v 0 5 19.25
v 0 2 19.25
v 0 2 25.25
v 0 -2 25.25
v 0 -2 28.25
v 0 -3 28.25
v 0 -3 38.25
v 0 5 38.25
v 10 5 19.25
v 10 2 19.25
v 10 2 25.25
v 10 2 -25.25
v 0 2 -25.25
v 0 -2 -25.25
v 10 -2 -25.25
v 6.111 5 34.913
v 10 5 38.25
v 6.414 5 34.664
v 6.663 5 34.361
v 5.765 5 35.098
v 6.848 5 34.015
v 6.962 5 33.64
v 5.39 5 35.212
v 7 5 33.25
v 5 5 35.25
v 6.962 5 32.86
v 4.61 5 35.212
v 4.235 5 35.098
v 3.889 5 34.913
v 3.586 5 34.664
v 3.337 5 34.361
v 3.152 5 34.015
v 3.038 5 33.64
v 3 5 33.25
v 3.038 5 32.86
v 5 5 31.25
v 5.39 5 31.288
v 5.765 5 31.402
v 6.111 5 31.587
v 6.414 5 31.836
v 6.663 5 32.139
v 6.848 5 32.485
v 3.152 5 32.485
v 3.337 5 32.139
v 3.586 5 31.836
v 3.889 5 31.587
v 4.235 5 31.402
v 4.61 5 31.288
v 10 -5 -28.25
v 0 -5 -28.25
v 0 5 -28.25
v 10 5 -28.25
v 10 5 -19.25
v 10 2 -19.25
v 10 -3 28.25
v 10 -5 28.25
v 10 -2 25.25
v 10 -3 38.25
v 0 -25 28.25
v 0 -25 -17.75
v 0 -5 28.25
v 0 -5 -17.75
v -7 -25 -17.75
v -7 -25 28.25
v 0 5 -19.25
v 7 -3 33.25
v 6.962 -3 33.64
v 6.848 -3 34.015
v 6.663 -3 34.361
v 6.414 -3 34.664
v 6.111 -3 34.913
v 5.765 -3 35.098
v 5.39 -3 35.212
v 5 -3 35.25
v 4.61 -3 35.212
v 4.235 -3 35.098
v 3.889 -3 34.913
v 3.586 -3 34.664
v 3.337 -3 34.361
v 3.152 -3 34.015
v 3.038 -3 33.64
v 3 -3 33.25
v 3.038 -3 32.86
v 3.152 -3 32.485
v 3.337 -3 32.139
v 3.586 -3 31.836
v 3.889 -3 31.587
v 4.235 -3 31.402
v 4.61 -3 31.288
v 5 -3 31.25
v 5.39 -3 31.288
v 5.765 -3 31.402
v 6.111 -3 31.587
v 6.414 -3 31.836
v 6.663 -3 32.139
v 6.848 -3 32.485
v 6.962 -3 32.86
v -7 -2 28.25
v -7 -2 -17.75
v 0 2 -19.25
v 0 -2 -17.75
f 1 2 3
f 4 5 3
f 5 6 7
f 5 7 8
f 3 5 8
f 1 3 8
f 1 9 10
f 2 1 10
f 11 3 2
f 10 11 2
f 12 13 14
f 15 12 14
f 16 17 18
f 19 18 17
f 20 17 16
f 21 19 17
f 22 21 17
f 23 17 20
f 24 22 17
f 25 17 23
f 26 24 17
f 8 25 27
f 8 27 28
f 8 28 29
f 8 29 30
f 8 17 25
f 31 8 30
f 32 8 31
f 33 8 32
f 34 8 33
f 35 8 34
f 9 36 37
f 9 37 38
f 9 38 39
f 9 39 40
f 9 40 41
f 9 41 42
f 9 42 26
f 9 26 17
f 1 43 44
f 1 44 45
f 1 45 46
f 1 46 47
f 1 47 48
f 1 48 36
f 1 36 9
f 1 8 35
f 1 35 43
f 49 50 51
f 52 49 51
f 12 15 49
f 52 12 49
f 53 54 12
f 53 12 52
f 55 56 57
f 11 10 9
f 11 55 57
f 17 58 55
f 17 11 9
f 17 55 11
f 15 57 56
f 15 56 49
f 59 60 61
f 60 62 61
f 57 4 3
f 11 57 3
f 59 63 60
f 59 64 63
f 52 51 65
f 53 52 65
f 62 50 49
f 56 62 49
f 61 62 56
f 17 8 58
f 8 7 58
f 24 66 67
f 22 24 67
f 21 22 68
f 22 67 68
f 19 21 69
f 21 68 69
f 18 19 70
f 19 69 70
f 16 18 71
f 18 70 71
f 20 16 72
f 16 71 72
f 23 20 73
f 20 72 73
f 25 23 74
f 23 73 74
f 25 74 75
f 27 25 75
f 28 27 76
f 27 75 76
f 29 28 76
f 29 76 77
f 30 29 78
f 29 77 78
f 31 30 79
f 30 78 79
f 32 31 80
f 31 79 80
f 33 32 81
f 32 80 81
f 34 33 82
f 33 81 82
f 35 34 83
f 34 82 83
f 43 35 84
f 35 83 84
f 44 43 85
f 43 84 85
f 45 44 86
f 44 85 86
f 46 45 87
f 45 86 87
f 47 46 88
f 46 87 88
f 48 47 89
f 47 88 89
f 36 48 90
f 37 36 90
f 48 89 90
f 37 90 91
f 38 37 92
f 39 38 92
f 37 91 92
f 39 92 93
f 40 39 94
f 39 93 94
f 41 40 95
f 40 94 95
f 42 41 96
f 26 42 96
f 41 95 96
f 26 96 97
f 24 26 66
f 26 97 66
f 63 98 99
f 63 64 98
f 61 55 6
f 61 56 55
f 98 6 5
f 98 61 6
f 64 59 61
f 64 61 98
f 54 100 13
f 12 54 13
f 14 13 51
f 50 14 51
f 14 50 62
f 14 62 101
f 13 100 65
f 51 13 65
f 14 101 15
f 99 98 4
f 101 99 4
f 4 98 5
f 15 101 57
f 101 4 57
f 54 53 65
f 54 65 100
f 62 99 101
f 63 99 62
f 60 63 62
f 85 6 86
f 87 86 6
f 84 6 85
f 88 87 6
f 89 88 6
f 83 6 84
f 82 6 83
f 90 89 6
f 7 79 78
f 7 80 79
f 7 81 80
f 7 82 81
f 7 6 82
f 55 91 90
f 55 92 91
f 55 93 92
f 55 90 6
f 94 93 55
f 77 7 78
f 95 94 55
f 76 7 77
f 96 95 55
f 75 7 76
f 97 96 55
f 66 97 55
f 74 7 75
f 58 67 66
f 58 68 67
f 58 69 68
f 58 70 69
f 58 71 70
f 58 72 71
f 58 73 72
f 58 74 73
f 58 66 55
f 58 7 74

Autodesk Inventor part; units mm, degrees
ref_plane "YZ Plane" through (0, 0, 0) normal (1, 0, 0) x (0, 1, 0)
ref_plane "XZ Plane" through (0, 0, 0) normal (0, 1, 0) x (-1, 0, 0)
ref_plane "XY Plane" through (0, 0, 0) normal (0, 0, 1) x (1, 0, 0)
sketch "Эскиз1" plane through (0, 0, 0) normal (1, 0, 0) x (0, 1, 0)
  line L0 (-2, 25.25) -> (2, 25.25)
  line L1 (2, 25.25) -> (2, -25.25)
  line L2 (2, -25.25) -> (-2, -25.25)
  line L3 (-2, -25.25) -> (-2, 25.25)
  line L4 (-2, 25.25) -> (2, -25.25) construction
  line L5 (2, 25.25) -> (-2, -25.25) construction
  line L6 (2, 25.25) -> (5, 25.25)
  line L7 (5, 25.25) -> (5, 19.25)
  line L8 (5, 19.25) -> (2, 19.25)
  line L9 (2, 19.25) -> (2, 25.25)
  line L10 (2, -25.25) -> (5, -25.25)
  line L11 (5, -25.25) -> (5, -19.25)
  line L12 (5, -19.25) -> (2, -19.25)
  line L13 (2, -19.25) -> (2, -25.25)
  line L14 (5, 25.25) -> (-5, 25.25)
  line L15 (-5, 25.25) -> (-5, 28.25)
  line L16 (-5, 28.25) -> (5, 28.25)
  line L17 (5, 28.25) -> (5, 25.25)
  line L18 (5, -25.25) -> (-5, -25.25)
  line L19 (-5, -25.25) -> (-5, -28.25)
  line L20 (-5, -28.25) -> (5, -28.25)
  line L21 (5, -28.25) -> (5, -25.25)
  line L22 (-5, 28.25) -> (-2, 28.25)
  line L23 (-2, 28.25) -> (-2, -28.25)
  line L24 (-2, -28.25) -> (-5, -28.25)
  line L25 (-5, -28.25) -> (-5, 28.25)
  point P0 (0, 0)
  dimension "d0" = 4
  dimension "d1" = 50.5
  dimension "d2" = 3
  dimension "d3" = 6
  dimension "d4" = 3
  dimension "d5" = 6
  dimension "d6" = 10
  dimension "d7" = 10
  dimension "d8" = 3
  dimension "d9" = 3
extrude "Выдавливание1" add sketch "Эскиз1" along normal blind 10 contours L23 L16 L17 L6 L0 | L3 L18 L25 L14 | L14 L15 L16 L23 | L6 L7 L8 L1 | L23 L20 L19 L18 | L2 L10 L21 L20 L23 | L1 L12 L11 L10
sketch "Эскиз2" plane through (0, -5, -28.25) normal (0, -1, 0) x (1, 0, 0)
  line L0 (10, 47.5) -> (10, 56.5) projected
  line L1 (10, 56.5) -> (0, 56.5)
  line L2 (0, 56.5) -> (0, 66.5)
  line L3 (0, 66.5) -> (10, 66.5)
  line L4 (10, 66.5) -> (10, 56.5)
  circle A0 centre (5, 61.5) radius 2
  line L5 (0, 61.5) -> (3, 61.5)
  line L6 (7, 61.5) -> (10, 61.5)
  point P0 (0, 28.25)
  dimension "d14" = 10
  dimension "d15" = 10
  dimension "d29" = 4
  dimension "d30" = 5
  dimension "d31" = 5
extrude "Выдавливание2" add sketch "Эскиз2" against normal blind 10 contours L1 L2 L5 A0 L6 L4 | L6 A0 L5 L2 L3 L4
sketch "Эскиз3" plane through (0, -5, -28.25) normal (0, -1, 0) x (1, 0, 0)
  line L0 (0, 56.5) -> (10, 56.5) projected
  line L1 (0, 56.5) -> (-7, 56.5)
  line L2 (-7, 56.5) -> (-7, 10.5)
  line L3 (-7, 10.5) -> (0, 10.5)
  line L4 (0, 10.5) -> (0, 56.5)
  point P0 (0, 28.25)
  dimension "d21" = 7
extrude "Выдавливание3" add sketch "Эскиз3" along normal blind 20 and the other way blind 1
sketch "Эскиз4" plane through (0, -5, -28.25) normal (0, -1, 0) x (1, 0, 0)
  line L0 (10, 47.5) -> (10, 56.5)
  line L1 (10, 56.5) -> (0, 56.5)
  line L2 (0, 56.5) -> (0, 66.5)
  line L3 (0, 66.5) -> (10, 66.5)
  line L4 (10, 66.5) -> (10, 56.5)
  circle A0 centre (5, 61.5) radius 2
  line L5 (0, 61.5) -> (3, 61.5)
  line L6 (7, 61.5) -> (10, 61.5)
  point P0 (0, 28.25)
  point P1 (0, 28.25)
  dimension "d32" = 10
  dimension "d33" = 10
  dimension "d34" = 4
  dimension "d35" = 5
  dimension "d36" = 5
extrude "Выдавливание4" cut sketch "Эскиз4" against normal blind 2 contours L1 L2 L5 A0 L6 L4 | L6 A0 L5 L2 L3 L4
move faces "Перенос1" translate (0, 2, 0) faces at (-2.3333, -4, -2.4167) (0, -11.6667, -2.4167)
properties part number "000.702 - Активный прижим" material "Пластик АБС"
